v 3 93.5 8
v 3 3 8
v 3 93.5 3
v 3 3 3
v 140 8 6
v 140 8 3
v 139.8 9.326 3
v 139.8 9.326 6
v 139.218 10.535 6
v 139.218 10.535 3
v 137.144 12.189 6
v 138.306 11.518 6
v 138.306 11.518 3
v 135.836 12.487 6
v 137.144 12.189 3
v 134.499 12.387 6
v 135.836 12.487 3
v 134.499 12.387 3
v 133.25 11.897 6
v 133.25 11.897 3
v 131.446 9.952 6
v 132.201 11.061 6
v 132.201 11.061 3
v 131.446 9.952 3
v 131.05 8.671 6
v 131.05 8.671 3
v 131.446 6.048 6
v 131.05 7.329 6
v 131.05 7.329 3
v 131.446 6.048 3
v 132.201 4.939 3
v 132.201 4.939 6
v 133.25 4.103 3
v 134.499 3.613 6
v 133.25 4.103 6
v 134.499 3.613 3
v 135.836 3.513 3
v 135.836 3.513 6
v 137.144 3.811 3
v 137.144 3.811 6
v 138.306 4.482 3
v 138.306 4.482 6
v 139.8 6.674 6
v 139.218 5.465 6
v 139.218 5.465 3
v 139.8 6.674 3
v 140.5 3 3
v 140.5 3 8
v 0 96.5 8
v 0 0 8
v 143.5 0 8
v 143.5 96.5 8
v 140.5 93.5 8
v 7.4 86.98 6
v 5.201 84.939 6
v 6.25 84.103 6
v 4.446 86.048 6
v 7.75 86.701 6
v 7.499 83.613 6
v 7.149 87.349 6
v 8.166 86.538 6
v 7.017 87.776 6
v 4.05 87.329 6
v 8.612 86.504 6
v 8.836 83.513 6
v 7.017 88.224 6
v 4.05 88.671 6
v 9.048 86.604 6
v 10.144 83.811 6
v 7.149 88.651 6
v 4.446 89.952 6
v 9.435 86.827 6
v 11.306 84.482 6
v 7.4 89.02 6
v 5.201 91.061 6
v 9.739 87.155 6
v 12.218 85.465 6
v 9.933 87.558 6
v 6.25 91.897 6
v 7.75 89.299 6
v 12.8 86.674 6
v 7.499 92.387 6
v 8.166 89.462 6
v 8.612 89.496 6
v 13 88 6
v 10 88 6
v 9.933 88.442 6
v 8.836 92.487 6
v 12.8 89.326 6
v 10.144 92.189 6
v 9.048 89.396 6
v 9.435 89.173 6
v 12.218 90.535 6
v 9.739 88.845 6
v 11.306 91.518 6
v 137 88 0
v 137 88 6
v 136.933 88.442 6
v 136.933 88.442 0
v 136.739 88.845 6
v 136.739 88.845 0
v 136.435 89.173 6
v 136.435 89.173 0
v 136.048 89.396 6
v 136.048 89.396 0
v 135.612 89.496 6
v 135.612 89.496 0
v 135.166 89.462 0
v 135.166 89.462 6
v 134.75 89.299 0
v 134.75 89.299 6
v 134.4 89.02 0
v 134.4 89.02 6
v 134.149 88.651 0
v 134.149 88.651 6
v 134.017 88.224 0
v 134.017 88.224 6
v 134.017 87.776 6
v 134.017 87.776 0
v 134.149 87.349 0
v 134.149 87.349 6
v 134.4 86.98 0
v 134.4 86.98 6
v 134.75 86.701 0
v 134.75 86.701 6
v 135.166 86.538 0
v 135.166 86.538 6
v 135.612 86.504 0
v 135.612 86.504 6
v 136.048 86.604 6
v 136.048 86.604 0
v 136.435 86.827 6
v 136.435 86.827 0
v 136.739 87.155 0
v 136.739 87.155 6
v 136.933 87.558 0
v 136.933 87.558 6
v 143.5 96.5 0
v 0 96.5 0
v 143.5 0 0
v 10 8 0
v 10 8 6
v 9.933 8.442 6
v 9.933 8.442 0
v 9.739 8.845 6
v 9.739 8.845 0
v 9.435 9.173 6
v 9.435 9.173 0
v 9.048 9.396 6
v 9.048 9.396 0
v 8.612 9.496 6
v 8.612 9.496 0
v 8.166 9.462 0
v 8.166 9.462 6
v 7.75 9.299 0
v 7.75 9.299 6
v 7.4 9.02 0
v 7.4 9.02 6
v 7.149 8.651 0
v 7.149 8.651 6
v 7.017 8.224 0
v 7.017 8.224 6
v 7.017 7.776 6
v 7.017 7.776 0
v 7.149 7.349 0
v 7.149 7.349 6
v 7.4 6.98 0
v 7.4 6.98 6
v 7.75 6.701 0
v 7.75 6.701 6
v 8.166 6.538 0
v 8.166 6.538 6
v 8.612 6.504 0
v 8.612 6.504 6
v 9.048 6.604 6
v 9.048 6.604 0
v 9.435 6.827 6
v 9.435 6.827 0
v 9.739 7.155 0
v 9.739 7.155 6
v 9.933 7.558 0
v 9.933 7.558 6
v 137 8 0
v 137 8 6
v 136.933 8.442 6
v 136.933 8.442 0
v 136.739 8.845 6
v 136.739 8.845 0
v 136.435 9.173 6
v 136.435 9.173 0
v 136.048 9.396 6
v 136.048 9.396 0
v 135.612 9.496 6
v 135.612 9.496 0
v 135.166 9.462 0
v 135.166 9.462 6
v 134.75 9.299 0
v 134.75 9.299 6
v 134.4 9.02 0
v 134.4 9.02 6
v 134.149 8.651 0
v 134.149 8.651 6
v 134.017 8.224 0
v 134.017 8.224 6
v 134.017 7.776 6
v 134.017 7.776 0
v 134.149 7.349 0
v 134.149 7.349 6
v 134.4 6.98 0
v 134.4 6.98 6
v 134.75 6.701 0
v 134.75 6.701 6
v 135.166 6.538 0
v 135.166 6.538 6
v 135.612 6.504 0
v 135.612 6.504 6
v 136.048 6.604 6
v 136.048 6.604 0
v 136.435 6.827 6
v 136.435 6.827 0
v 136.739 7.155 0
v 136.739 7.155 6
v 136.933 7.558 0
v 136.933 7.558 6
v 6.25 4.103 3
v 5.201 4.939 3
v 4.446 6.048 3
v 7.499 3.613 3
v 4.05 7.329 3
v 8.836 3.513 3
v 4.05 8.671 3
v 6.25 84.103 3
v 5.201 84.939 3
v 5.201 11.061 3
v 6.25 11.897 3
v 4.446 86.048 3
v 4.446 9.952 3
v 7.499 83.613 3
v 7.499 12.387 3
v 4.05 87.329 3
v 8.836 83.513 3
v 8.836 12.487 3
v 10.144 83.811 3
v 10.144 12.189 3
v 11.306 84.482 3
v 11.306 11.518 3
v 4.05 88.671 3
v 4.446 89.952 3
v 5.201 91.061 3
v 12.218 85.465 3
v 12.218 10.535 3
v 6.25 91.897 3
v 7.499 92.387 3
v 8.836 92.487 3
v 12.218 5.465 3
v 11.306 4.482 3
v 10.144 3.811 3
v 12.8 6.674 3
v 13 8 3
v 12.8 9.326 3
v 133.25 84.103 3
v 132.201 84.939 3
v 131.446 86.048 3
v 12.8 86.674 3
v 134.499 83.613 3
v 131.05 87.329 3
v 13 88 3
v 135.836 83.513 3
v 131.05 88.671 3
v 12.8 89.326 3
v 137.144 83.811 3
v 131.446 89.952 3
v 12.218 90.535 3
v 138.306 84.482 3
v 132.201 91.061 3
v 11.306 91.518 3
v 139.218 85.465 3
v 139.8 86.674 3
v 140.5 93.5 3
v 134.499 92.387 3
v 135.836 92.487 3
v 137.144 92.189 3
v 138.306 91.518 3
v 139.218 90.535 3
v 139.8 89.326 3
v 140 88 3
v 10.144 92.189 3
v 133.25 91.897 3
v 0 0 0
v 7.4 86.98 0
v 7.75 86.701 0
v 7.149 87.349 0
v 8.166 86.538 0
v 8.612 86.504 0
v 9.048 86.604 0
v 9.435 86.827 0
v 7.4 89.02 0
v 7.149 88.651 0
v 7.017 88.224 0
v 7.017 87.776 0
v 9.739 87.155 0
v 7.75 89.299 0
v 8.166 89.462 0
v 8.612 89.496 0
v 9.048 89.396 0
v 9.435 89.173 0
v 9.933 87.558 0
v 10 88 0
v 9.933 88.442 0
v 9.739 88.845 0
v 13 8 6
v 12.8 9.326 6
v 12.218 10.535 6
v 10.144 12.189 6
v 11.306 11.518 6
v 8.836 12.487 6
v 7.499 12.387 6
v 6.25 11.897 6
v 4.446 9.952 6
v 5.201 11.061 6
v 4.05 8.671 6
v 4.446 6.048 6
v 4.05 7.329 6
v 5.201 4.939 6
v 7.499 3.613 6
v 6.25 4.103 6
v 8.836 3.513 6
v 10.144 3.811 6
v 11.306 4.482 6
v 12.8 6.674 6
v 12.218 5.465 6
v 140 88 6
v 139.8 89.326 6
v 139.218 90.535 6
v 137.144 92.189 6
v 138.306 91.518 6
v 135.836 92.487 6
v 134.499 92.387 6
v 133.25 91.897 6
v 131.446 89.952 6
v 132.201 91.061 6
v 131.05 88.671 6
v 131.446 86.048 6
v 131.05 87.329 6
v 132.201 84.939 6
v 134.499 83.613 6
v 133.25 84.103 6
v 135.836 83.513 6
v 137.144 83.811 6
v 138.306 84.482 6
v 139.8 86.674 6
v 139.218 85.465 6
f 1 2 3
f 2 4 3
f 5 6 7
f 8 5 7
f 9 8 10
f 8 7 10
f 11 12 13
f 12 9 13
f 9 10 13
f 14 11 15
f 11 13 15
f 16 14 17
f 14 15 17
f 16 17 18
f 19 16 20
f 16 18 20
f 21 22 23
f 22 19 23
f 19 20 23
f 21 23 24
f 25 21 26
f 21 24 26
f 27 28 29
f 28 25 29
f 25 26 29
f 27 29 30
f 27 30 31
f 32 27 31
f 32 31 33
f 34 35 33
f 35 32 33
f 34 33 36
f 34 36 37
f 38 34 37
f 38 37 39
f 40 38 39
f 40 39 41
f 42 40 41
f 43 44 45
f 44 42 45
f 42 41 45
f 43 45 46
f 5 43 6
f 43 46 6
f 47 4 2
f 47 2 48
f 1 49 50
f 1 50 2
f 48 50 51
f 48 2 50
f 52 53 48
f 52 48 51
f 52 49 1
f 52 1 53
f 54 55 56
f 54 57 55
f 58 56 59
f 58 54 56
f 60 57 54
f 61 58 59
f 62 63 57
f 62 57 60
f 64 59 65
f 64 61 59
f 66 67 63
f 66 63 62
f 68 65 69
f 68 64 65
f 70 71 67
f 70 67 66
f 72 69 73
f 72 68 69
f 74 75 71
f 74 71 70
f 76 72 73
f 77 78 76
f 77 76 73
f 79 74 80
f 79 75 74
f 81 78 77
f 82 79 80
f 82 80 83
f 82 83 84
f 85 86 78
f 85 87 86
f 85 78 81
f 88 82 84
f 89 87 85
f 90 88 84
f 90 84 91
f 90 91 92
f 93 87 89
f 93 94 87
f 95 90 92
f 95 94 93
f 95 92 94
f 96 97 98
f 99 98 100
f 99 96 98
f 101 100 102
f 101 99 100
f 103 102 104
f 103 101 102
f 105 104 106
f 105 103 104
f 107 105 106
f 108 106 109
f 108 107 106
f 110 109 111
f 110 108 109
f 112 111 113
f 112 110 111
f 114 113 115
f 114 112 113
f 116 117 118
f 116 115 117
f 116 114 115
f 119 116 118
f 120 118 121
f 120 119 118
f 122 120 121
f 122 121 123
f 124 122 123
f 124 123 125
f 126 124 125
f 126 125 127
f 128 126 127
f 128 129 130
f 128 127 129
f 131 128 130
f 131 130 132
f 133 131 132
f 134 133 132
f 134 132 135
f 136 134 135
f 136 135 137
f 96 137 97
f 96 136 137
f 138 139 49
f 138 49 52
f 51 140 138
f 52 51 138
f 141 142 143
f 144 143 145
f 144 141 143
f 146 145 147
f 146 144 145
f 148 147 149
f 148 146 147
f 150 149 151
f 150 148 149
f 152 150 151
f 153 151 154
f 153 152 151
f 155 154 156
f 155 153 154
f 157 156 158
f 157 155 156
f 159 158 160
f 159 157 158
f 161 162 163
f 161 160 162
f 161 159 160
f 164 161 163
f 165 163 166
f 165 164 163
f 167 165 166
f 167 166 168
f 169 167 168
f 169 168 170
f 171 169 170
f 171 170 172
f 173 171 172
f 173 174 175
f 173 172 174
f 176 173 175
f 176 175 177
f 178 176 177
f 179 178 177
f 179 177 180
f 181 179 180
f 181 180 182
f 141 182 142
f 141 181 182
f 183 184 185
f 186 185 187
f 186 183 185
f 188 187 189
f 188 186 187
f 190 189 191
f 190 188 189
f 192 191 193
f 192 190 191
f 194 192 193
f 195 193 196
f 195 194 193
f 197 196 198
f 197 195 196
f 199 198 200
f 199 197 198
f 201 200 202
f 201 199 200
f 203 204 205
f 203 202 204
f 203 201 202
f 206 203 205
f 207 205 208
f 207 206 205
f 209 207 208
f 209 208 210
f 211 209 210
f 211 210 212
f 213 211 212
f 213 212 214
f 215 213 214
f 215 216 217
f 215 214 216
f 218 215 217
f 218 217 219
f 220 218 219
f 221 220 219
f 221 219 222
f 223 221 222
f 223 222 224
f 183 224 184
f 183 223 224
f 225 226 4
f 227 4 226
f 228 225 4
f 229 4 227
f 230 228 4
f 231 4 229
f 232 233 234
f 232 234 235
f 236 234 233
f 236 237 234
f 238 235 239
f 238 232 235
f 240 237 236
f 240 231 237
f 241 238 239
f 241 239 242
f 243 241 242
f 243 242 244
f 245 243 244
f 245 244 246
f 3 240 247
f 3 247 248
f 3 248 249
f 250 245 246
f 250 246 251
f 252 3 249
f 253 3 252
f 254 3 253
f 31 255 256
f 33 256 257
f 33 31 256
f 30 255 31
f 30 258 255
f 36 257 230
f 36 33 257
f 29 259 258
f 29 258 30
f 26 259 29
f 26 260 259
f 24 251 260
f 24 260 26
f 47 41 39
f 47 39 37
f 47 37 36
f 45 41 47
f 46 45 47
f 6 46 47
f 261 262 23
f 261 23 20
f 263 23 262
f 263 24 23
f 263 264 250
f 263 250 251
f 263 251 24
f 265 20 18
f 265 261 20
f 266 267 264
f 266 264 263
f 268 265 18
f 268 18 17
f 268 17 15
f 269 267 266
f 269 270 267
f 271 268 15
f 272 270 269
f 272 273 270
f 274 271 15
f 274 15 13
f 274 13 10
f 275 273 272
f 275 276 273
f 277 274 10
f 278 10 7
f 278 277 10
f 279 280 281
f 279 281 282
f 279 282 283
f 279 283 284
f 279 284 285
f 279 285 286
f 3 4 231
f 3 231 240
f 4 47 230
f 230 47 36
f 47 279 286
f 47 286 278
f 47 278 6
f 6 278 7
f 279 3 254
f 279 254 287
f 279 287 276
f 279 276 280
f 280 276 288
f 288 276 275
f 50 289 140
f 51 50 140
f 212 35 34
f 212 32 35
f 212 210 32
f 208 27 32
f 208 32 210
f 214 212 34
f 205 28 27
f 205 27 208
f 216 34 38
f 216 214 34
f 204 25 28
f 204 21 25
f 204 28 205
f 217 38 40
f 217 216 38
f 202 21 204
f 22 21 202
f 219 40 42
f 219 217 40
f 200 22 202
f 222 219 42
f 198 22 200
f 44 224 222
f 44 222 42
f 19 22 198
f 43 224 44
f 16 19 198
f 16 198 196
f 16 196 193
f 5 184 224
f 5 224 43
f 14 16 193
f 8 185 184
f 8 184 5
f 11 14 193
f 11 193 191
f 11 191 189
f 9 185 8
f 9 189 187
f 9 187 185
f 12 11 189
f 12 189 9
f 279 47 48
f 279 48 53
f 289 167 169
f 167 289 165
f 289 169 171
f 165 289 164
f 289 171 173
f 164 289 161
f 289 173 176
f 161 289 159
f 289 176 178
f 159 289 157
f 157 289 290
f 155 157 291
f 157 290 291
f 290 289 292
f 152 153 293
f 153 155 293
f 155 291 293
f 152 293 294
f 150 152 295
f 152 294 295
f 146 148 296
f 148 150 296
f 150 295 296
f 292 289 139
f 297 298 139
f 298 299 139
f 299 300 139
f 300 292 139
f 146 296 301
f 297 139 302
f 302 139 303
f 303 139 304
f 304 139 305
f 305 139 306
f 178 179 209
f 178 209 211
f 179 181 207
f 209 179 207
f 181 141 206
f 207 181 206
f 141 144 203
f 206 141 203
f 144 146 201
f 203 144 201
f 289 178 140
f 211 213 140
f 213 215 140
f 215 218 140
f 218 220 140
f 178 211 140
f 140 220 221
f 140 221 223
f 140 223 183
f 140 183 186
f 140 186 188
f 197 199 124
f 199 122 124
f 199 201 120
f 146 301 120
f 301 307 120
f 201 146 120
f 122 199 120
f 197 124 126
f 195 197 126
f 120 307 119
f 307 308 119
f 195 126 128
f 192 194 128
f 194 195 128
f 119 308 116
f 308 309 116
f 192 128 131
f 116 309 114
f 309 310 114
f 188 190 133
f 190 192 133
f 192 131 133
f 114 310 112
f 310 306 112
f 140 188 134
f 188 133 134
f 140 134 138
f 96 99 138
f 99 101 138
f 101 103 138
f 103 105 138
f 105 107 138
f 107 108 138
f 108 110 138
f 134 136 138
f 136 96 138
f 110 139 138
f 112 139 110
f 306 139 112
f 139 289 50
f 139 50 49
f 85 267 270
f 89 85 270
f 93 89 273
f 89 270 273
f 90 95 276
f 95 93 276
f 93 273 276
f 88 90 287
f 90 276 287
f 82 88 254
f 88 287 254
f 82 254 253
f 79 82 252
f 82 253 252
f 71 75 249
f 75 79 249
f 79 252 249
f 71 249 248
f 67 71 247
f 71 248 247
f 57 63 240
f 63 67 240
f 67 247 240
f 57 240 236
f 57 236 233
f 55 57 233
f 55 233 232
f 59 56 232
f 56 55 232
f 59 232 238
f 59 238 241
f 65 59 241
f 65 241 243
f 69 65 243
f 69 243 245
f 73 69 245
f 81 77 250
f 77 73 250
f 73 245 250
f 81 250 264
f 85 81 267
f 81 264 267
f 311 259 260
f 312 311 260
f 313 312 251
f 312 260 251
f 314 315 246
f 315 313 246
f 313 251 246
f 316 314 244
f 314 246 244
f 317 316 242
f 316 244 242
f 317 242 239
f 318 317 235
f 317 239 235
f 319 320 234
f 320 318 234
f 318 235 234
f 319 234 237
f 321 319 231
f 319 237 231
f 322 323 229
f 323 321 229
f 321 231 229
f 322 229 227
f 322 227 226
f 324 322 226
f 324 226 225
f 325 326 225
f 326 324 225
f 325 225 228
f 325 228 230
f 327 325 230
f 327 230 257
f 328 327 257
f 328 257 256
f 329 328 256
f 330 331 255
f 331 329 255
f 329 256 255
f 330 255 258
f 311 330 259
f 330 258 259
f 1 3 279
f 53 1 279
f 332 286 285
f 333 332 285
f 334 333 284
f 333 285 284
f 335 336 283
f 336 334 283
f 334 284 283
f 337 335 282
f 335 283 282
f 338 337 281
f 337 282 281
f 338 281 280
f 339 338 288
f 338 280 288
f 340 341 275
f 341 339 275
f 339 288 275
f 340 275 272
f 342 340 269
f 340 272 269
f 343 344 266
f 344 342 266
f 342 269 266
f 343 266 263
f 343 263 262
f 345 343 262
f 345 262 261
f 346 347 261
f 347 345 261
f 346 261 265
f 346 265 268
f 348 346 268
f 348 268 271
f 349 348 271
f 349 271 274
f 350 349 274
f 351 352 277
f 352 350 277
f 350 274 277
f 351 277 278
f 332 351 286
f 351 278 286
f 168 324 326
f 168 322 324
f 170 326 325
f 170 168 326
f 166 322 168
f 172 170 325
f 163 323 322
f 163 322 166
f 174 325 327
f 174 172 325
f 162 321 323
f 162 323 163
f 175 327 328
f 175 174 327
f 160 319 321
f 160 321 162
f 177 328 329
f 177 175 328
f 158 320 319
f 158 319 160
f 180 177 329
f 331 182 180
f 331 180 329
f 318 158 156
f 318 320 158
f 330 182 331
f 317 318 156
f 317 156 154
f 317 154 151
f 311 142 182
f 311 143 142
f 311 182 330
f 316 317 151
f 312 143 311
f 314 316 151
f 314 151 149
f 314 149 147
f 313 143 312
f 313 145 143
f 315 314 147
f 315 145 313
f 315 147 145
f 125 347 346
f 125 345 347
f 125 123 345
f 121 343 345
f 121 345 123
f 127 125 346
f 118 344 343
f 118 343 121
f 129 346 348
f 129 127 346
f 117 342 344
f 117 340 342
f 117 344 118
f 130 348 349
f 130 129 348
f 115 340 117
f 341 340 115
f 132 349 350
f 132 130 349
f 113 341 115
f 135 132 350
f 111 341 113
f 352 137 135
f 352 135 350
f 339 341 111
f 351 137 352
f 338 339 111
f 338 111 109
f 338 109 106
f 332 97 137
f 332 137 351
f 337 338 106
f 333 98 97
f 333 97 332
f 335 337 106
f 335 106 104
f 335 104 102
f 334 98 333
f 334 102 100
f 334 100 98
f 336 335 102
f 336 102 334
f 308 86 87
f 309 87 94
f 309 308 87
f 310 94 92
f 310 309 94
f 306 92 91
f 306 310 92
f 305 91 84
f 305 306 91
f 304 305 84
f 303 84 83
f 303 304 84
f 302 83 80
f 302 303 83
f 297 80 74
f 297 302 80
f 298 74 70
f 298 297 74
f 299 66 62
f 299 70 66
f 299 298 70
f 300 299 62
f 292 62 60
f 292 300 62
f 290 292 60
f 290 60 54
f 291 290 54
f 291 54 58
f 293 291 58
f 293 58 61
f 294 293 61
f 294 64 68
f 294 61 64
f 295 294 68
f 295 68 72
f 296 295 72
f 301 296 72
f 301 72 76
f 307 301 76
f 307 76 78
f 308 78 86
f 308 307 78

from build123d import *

# Parameters (mm, degrees)
SKETCH1_W           = 143.5
SKETCH1_H           = 96.5
SKETCH1_R           = 1.5
BOSS_EXTRUDE1_DEPTH = 8
SHELL1_T            = -3
SKETCH2_W           = 137.5
SKETCH2_H           = 90.5
CUT_EXTRUDE1_DEPTH  = 2


with BuildPart() as part:
    # Sketch1 → Boss-Extrude1 (new body)
    with BuildSketch(Plane.XY):
        with Locations((71.75, 48.25)):
            Rectangle(SKETCH1_W, SKETCH1_H)
        with Locations((8.5, 88)):
            Circle(SKETCH1_R, mode=Mode.SUBTRACT)
        with Locations((8.5, 8)):
            Circle(SKETCH1_R, mode=Mode.SUBTRACT)
        with Locations((135.5, 8)):
            Circle(SKETCH1_R, mode=Mode.SUBTRACT)
        with Locations((135.5, 88)):
            Circle(SKETCH1_R, mode=Mode.SUBTRACT)
    extrude(amount=BOSS_EXTRUDE1_DEPTH)

    # Shell1
    shell1_openings = [part.faces().sort_by_distance(p)[0] for p in [
        (71.75, 48.25, 8),
    ]]
    offset(amount=SHELL1_T, openings=shell1_openings, kind=Kind.INTERSECTION)

    # Sketch2 → Cut-Extrude1 (cut)
    with BuildSketch(Plane.XY.offset(8)):
        with Locations((71.75, 48.25)):
            Rectangle(SKETCH2_W, SKETCH2_H)
    extrude(amount=-CUT_EXTRUDE1_DEPTH, mode=Mode.SUBTRACT)


solid = part.part
